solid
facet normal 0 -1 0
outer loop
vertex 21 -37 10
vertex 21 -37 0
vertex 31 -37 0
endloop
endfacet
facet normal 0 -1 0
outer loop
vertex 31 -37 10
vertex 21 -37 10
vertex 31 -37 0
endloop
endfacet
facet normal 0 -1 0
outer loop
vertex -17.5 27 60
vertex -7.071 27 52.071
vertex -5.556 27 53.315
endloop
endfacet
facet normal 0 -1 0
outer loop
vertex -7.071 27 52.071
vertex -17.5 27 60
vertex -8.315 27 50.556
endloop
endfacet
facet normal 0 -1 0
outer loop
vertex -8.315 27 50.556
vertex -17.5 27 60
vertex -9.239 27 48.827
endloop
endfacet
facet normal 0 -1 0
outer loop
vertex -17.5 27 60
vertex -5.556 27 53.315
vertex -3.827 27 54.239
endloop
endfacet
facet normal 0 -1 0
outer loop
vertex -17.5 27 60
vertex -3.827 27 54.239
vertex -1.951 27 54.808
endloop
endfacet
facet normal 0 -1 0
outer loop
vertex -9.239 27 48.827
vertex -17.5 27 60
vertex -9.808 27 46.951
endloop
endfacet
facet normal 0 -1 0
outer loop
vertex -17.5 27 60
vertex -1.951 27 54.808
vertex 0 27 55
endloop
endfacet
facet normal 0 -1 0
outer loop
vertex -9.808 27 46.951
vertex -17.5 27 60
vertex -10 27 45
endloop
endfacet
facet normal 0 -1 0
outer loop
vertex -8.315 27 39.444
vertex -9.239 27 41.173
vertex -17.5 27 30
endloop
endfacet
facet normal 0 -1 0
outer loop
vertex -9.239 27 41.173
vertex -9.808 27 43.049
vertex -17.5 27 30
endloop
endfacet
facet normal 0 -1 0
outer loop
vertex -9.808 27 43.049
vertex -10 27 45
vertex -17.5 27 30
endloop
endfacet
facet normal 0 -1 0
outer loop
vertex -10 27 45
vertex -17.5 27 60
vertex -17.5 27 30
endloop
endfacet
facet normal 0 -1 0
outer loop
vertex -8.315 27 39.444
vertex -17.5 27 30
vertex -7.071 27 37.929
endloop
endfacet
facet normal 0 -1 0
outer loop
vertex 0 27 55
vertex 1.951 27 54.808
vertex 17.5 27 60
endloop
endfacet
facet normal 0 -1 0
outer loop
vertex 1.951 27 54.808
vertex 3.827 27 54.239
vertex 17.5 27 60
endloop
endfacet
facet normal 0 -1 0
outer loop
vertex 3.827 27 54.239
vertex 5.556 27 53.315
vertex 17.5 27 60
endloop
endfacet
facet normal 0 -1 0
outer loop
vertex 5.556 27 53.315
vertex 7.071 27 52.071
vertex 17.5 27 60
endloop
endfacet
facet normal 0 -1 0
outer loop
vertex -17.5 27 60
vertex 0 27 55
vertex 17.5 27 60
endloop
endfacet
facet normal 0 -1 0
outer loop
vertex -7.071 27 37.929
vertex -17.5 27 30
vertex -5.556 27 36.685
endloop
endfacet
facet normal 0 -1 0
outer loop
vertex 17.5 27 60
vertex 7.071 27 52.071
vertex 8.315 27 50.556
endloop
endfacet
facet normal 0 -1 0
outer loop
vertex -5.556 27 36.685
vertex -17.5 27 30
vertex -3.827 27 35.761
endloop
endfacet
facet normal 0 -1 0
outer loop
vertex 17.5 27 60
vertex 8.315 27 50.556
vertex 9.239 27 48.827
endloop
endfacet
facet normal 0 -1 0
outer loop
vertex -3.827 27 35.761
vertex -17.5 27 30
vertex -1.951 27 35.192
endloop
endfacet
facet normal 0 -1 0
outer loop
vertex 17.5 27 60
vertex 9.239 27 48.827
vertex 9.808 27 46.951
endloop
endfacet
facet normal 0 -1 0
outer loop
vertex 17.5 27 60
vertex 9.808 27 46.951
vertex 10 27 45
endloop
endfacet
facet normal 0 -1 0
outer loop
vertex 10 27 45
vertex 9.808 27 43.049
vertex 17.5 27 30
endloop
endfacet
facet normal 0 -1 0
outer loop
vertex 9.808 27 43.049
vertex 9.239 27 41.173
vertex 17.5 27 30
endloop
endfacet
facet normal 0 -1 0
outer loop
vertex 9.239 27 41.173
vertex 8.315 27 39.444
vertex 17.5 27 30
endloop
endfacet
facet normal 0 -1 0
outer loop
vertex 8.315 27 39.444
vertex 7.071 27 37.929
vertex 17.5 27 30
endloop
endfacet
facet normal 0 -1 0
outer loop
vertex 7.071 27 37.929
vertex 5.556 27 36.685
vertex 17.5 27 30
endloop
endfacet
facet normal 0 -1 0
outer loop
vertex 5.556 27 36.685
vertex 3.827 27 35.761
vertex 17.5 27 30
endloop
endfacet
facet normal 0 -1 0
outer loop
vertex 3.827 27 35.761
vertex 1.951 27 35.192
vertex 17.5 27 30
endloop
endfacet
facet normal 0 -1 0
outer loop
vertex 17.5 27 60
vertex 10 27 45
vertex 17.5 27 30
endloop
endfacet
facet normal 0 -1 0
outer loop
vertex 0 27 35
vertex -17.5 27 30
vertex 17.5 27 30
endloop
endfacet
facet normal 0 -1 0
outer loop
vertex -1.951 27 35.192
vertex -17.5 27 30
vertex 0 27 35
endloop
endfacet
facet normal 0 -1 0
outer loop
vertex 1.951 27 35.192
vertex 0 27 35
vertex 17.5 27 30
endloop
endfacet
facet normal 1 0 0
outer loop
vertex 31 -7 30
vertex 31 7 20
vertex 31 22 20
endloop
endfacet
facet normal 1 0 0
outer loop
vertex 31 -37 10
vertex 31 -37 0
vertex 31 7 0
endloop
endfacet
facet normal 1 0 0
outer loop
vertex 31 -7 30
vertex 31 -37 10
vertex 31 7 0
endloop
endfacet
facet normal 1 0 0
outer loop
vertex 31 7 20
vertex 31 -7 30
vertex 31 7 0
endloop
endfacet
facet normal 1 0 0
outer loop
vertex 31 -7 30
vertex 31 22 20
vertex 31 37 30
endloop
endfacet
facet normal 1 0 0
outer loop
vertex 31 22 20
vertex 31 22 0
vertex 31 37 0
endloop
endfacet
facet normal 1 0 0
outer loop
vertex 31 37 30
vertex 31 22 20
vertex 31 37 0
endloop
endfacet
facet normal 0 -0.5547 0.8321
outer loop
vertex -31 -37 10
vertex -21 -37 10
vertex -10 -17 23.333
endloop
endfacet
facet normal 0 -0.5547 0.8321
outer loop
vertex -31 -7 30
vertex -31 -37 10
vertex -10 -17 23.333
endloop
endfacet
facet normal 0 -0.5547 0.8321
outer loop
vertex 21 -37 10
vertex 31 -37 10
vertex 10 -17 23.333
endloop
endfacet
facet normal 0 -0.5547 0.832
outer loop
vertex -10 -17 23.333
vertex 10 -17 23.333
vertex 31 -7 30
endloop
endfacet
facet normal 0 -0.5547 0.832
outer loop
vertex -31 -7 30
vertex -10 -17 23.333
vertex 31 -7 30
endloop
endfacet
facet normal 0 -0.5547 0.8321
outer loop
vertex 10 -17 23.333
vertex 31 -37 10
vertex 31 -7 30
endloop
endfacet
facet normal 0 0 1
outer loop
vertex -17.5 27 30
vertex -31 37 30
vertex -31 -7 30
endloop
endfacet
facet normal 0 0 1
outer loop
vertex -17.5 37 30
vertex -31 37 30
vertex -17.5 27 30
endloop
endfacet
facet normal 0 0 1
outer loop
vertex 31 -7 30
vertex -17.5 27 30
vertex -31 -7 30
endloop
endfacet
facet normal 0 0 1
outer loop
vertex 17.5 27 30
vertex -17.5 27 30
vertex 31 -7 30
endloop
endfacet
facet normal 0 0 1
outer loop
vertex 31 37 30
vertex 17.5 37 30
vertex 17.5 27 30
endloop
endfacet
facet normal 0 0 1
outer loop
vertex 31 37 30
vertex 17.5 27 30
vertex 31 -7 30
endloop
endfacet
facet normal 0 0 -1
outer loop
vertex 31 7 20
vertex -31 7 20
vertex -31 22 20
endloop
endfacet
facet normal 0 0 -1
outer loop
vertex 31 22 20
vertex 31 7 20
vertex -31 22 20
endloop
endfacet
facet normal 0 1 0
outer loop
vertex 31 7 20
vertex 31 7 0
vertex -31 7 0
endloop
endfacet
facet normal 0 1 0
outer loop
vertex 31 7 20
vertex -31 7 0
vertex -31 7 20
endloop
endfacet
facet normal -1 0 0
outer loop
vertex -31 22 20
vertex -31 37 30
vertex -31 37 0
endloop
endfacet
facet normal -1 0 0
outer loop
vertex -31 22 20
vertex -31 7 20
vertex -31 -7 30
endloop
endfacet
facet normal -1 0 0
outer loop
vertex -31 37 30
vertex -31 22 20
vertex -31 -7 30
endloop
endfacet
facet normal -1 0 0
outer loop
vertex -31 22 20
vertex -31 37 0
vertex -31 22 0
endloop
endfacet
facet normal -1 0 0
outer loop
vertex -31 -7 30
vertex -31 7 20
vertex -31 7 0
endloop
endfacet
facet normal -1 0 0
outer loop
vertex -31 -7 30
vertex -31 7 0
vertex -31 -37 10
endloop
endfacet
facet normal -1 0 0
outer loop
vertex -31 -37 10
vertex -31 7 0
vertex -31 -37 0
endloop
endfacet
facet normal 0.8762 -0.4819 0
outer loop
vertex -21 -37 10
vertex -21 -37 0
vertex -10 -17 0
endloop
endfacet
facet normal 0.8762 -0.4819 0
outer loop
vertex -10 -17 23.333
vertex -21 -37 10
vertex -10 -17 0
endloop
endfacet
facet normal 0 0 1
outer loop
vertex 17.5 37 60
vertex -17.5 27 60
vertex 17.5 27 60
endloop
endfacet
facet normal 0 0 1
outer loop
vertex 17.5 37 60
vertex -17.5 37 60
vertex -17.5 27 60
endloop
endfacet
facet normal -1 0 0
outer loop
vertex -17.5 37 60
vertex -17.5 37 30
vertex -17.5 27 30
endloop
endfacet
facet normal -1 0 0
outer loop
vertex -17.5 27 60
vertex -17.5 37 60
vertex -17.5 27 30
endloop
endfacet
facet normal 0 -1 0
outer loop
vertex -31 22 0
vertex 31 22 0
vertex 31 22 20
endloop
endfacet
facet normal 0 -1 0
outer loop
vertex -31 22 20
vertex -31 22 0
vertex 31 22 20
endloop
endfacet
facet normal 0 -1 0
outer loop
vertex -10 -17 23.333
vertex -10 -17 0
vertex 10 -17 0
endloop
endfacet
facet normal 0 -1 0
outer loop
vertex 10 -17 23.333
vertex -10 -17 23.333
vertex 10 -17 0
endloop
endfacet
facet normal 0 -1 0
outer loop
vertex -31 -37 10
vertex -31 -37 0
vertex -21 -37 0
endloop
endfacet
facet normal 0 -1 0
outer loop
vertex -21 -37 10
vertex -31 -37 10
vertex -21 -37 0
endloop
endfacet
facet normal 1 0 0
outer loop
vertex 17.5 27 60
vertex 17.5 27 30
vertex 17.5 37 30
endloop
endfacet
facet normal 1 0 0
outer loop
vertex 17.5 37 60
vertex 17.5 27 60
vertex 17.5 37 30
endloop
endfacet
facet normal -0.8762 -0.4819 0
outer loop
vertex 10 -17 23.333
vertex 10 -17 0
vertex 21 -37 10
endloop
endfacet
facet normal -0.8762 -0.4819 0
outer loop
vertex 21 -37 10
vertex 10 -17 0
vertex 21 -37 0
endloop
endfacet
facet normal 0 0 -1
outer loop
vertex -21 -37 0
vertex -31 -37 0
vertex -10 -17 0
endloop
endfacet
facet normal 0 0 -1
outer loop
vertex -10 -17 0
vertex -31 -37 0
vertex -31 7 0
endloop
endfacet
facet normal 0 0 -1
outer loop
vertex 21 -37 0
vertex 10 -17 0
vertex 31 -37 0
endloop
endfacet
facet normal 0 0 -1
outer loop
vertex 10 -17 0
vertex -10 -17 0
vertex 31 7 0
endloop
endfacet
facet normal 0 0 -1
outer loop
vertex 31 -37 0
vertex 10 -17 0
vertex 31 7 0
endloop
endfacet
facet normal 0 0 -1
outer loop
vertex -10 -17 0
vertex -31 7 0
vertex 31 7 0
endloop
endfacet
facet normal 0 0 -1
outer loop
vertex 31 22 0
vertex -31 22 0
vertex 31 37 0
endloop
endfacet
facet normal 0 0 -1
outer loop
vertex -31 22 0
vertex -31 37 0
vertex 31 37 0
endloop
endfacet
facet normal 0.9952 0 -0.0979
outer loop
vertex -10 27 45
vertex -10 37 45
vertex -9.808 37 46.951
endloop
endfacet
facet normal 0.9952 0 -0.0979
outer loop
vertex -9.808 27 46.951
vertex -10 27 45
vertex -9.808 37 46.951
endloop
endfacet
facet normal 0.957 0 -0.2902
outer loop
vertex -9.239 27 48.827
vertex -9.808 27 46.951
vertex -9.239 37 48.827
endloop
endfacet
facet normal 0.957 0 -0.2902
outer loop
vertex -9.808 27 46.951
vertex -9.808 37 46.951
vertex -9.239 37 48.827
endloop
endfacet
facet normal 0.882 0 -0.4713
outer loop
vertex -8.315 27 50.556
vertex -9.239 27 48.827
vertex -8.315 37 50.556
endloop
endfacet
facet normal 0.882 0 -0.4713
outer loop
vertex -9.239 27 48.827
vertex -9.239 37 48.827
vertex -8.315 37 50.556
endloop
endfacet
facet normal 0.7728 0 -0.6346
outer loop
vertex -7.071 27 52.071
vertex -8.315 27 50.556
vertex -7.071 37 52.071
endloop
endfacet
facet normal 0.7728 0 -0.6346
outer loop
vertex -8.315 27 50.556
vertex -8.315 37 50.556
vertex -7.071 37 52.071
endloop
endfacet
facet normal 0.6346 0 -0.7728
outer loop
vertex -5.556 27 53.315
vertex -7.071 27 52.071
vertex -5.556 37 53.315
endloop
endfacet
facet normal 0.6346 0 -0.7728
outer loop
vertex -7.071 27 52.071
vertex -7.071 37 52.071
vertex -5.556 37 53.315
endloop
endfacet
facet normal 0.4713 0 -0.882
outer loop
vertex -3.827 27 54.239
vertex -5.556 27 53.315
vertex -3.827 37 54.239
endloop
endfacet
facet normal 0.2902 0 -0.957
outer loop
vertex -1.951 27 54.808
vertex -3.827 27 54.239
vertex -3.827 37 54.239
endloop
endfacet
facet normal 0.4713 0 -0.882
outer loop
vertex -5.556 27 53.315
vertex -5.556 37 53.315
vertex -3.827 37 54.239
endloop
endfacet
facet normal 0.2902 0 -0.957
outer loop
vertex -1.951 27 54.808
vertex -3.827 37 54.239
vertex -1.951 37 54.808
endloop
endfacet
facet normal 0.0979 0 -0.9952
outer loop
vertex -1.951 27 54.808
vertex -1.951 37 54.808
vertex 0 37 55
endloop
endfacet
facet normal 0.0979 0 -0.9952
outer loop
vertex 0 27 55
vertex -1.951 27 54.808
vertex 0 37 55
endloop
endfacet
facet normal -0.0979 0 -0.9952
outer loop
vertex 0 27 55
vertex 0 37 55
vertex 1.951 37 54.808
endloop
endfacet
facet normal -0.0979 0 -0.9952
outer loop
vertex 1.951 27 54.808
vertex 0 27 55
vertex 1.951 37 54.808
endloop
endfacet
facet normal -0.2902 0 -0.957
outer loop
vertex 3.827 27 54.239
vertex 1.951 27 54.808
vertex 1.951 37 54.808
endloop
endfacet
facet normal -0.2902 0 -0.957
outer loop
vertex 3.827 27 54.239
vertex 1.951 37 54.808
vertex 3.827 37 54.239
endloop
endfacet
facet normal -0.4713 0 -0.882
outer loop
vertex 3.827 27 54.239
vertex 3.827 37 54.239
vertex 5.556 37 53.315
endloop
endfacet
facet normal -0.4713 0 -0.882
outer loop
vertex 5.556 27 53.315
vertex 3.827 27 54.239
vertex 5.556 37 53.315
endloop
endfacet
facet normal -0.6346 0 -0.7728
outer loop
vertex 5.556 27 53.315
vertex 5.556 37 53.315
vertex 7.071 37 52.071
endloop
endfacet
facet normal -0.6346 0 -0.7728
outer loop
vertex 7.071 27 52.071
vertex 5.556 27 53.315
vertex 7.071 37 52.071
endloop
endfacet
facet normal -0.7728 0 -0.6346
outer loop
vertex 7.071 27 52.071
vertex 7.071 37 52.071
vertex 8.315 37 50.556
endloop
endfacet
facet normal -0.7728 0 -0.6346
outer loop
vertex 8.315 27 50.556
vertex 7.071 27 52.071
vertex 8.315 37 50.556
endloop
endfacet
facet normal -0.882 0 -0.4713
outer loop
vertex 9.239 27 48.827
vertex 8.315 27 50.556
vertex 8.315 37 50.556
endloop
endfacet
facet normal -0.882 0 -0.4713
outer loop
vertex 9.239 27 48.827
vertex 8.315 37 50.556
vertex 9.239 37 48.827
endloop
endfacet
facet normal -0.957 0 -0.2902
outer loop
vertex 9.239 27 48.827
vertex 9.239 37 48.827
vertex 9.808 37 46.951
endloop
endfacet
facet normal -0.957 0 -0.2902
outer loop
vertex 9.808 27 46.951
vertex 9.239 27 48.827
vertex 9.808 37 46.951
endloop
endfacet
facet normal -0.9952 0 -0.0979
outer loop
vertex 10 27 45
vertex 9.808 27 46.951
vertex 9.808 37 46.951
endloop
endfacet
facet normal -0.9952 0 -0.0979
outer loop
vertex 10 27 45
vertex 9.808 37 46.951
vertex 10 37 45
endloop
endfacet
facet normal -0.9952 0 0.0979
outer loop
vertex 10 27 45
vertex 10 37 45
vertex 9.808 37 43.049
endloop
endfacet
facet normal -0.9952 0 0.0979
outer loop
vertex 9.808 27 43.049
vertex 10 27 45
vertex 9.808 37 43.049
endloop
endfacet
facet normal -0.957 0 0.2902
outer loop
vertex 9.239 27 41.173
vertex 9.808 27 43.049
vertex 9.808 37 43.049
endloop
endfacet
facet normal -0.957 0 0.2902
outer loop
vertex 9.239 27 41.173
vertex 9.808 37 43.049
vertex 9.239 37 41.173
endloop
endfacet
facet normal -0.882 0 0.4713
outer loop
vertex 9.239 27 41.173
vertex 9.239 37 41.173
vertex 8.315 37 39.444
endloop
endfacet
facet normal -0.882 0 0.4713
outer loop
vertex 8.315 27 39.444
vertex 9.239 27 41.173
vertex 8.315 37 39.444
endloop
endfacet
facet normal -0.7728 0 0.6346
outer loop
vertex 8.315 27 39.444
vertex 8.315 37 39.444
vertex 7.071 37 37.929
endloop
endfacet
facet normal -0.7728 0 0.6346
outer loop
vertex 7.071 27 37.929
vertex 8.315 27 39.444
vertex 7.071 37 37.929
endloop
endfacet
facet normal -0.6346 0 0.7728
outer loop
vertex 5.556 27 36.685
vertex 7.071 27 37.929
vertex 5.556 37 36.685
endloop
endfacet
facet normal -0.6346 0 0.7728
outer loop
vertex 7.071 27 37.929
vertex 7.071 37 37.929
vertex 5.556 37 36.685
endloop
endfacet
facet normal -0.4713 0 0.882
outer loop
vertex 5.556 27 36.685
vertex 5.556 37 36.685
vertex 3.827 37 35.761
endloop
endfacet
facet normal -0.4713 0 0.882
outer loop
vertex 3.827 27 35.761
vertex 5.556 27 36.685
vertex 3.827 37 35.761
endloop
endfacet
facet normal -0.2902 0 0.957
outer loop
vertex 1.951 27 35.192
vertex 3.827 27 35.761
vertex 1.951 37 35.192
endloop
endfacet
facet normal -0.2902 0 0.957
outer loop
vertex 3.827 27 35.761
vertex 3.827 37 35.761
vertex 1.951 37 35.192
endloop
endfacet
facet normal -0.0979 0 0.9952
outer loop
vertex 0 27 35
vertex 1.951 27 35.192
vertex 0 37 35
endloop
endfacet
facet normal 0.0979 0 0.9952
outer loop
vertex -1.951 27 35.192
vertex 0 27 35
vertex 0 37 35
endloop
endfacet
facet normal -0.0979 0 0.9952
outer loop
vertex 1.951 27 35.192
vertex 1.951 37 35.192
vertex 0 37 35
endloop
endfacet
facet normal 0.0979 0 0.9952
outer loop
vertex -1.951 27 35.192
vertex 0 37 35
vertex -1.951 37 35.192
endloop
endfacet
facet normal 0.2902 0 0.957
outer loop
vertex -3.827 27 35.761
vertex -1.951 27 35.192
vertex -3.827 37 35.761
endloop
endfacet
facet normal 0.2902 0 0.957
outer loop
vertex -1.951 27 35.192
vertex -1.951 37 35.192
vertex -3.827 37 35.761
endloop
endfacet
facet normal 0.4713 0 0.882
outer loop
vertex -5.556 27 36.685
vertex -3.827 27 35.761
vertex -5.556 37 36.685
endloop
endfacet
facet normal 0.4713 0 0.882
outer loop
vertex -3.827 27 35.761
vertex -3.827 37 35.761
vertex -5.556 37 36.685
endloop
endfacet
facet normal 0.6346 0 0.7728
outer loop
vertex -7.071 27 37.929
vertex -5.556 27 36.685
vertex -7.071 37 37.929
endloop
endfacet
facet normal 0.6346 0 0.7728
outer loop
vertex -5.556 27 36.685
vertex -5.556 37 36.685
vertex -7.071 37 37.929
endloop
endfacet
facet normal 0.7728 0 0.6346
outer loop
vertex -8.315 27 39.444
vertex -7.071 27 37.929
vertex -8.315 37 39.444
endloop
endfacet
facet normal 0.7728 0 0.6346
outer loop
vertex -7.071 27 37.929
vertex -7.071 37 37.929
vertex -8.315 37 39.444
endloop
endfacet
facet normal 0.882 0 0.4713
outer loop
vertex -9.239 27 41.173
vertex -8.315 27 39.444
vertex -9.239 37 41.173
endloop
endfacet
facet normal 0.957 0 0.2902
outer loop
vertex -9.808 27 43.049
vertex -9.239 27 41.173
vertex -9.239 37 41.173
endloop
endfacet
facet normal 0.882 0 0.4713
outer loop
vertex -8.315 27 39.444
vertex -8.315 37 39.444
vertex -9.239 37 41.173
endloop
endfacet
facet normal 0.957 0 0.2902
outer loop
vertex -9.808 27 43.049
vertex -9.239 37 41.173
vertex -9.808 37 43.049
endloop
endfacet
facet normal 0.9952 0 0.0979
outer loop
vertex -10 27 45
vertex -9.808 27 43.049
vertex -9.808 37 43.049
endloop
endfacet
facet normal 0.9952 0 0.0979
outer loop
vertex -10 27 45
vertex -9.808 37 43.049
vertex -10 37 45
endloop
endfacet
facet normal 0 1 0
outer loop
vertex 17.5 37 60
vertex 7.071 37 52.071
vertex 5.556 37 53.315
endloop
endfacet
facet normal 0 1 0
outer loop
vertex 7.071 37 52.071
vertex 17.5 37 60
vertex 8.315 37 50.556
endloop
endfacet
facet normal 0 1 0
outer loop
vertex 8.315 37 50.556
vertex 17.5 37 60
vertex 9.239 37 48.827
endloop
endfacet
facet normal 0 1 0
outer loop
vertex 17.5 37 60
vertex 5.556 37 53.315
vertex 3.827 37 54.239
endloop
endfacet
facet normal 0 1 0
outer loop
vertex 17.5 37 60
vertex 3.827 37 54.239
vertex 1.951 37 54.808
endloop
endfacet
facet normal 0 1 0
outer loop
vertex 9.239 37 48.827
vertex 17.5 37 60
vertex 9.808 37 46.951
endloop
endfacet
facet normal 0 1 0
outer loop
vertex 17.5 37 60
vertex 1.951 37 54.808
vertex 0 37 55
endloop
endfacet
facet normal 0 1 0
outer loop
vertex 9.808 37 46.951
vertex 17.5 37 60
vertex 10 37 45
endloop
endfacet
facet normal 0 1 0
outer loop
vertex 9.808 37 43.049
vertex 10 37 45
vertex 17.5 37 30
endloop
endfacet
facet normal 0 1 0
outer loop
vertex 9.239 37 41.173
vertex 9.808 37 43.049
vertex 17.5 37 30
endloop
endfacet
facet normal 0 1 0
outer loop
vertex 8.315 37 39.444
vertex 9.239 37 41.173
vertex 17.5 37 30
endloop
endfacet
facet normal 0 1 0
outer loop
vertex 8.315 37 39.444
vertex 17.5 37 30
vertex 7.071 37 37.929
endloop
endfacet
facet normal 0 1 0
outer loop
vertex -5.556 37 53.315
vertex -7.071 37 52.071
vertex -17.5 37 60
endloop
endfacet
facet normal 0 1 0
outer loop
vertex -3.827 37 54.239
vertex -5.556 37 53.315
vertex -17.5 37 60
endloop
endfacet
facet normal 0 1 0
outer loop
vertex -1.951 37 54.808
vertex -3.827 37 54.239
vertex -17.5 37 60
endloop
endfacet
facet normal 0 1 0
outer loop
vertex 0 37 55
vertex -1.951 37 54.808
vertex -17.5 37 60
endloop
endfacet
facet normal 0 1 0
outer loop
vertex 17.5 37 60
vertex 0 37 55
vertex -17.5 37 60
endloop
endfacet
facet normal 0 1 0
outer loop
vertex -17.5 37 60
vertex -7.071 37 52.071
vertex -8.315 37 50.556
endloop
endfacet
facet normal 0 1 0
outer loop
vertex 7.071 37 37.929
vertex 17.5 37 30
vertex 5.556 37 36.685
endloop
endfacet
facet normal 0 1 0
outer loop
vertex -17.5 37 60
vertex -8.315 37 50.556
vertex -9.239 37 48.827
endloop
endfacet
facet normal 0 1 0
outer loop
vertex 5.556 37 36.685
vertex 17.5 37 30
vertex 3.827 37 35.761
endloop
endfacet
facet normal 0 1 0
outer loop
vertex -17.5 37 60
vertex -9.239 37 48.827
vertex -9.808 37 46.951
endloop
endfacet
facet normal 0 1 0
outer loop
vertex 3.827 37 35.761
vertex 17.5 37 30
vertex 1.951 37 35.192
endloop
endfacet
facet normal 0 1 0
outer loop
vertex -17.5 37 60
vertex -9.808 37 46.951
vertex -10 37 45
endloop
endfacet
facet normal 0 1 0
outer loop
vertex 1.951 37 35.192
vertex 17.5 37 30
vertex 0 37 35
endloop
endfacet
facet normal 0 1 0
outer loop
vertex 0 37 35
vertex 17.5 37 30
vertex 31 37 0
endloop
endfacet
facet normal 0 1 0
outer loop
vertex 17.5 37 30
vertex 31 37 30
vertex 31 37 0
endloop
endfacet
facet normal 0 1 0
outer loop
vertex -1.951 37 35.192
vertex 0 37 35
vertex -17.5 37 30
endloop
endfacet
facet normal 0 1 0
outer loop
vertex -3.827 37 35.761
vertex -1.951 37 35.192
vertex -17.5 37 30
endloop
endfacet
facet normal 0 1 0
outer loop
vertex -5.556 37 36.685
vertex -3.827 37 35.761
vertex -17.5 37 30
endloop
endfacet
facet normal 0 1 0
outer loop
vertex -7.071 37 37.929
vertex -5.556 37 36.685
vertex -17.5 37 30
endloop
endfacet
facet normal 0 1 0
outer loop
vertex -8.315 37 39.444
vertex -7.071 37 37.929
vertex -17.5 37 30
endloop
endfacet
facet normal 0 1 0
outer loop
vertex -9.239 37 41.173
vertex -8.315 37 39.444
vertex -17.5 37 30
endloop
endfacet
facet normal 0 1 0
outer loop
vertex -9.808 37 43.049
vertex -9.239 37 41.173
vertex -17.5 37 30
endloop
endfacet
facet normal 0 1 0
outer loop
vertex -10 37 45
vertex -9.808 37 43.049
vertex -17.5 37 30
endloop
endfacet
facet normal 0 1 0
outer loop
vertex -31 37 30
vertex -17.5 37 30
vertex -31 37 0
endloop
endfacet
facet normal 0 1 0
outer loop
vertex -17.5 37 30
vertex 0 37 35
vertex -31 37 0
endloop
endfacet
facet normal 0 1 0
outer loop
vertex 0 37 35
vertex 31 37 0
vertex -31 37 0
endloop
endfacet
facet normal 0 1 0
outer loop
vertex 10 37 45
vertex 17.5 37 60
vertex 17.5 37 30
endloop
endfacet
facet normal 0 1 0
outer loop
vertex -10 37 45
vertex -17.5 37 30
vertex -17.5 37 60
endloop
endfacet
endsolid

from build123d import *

# Parameters (mm, degrees)
F1_DEPTH = 30
F2_W     = 15
F2_H     = 20
F3_DEPTH = 84.5
F5_DEPTH = 30
F6_R     = 10
F7_DEPTH = 25


with BuildPart() as f1:
    # F0 (on Top) → F1 (new body)
    with BuildSketch(Plane.XY):
        Polygon((21, -37), (31, -37), (31, 37), (-31, 37), (-31, -37), (-21, -37), (-10, -17), (0, -17), (10, -17), align=None)
    extrude(amount=F1_DEPTH)

    # F2 (on face) → F3 (cut)
    with BuildSketch(Plane.YZ.offset(31)):
        with Locations((14.5, 10)):
            Rectangle(F2_W, F2_H)
        Polygon((-37, 10), (-7, 30), (-37, 30), align=None)
    extrude(amount=-F3_DEPTH, mode=Mode.SUBTRACT)

    # F4 (on face) → F5 (join)
    with BuildSketch(Plane.XY.offset(30)):
        Polygon((-17.499998, 27), (17.500002, 27), (17.5, 37), (-17.5, 37), align=None)
    extrude(amount=F5_DEPTH)

    # F6 (on face) → F7 (cut)
    with BuildSketch(Plane(origin=(0, 37, 0), x_dir=(-1, 0, 0), z_dir=(0, 1, 0))):
        with Locations((0, 45)):
            Circle(F6_R)
    extrude(amount=-F7_DEPTH, mode=Mode.SUBTRACT)


solid = f1.part
